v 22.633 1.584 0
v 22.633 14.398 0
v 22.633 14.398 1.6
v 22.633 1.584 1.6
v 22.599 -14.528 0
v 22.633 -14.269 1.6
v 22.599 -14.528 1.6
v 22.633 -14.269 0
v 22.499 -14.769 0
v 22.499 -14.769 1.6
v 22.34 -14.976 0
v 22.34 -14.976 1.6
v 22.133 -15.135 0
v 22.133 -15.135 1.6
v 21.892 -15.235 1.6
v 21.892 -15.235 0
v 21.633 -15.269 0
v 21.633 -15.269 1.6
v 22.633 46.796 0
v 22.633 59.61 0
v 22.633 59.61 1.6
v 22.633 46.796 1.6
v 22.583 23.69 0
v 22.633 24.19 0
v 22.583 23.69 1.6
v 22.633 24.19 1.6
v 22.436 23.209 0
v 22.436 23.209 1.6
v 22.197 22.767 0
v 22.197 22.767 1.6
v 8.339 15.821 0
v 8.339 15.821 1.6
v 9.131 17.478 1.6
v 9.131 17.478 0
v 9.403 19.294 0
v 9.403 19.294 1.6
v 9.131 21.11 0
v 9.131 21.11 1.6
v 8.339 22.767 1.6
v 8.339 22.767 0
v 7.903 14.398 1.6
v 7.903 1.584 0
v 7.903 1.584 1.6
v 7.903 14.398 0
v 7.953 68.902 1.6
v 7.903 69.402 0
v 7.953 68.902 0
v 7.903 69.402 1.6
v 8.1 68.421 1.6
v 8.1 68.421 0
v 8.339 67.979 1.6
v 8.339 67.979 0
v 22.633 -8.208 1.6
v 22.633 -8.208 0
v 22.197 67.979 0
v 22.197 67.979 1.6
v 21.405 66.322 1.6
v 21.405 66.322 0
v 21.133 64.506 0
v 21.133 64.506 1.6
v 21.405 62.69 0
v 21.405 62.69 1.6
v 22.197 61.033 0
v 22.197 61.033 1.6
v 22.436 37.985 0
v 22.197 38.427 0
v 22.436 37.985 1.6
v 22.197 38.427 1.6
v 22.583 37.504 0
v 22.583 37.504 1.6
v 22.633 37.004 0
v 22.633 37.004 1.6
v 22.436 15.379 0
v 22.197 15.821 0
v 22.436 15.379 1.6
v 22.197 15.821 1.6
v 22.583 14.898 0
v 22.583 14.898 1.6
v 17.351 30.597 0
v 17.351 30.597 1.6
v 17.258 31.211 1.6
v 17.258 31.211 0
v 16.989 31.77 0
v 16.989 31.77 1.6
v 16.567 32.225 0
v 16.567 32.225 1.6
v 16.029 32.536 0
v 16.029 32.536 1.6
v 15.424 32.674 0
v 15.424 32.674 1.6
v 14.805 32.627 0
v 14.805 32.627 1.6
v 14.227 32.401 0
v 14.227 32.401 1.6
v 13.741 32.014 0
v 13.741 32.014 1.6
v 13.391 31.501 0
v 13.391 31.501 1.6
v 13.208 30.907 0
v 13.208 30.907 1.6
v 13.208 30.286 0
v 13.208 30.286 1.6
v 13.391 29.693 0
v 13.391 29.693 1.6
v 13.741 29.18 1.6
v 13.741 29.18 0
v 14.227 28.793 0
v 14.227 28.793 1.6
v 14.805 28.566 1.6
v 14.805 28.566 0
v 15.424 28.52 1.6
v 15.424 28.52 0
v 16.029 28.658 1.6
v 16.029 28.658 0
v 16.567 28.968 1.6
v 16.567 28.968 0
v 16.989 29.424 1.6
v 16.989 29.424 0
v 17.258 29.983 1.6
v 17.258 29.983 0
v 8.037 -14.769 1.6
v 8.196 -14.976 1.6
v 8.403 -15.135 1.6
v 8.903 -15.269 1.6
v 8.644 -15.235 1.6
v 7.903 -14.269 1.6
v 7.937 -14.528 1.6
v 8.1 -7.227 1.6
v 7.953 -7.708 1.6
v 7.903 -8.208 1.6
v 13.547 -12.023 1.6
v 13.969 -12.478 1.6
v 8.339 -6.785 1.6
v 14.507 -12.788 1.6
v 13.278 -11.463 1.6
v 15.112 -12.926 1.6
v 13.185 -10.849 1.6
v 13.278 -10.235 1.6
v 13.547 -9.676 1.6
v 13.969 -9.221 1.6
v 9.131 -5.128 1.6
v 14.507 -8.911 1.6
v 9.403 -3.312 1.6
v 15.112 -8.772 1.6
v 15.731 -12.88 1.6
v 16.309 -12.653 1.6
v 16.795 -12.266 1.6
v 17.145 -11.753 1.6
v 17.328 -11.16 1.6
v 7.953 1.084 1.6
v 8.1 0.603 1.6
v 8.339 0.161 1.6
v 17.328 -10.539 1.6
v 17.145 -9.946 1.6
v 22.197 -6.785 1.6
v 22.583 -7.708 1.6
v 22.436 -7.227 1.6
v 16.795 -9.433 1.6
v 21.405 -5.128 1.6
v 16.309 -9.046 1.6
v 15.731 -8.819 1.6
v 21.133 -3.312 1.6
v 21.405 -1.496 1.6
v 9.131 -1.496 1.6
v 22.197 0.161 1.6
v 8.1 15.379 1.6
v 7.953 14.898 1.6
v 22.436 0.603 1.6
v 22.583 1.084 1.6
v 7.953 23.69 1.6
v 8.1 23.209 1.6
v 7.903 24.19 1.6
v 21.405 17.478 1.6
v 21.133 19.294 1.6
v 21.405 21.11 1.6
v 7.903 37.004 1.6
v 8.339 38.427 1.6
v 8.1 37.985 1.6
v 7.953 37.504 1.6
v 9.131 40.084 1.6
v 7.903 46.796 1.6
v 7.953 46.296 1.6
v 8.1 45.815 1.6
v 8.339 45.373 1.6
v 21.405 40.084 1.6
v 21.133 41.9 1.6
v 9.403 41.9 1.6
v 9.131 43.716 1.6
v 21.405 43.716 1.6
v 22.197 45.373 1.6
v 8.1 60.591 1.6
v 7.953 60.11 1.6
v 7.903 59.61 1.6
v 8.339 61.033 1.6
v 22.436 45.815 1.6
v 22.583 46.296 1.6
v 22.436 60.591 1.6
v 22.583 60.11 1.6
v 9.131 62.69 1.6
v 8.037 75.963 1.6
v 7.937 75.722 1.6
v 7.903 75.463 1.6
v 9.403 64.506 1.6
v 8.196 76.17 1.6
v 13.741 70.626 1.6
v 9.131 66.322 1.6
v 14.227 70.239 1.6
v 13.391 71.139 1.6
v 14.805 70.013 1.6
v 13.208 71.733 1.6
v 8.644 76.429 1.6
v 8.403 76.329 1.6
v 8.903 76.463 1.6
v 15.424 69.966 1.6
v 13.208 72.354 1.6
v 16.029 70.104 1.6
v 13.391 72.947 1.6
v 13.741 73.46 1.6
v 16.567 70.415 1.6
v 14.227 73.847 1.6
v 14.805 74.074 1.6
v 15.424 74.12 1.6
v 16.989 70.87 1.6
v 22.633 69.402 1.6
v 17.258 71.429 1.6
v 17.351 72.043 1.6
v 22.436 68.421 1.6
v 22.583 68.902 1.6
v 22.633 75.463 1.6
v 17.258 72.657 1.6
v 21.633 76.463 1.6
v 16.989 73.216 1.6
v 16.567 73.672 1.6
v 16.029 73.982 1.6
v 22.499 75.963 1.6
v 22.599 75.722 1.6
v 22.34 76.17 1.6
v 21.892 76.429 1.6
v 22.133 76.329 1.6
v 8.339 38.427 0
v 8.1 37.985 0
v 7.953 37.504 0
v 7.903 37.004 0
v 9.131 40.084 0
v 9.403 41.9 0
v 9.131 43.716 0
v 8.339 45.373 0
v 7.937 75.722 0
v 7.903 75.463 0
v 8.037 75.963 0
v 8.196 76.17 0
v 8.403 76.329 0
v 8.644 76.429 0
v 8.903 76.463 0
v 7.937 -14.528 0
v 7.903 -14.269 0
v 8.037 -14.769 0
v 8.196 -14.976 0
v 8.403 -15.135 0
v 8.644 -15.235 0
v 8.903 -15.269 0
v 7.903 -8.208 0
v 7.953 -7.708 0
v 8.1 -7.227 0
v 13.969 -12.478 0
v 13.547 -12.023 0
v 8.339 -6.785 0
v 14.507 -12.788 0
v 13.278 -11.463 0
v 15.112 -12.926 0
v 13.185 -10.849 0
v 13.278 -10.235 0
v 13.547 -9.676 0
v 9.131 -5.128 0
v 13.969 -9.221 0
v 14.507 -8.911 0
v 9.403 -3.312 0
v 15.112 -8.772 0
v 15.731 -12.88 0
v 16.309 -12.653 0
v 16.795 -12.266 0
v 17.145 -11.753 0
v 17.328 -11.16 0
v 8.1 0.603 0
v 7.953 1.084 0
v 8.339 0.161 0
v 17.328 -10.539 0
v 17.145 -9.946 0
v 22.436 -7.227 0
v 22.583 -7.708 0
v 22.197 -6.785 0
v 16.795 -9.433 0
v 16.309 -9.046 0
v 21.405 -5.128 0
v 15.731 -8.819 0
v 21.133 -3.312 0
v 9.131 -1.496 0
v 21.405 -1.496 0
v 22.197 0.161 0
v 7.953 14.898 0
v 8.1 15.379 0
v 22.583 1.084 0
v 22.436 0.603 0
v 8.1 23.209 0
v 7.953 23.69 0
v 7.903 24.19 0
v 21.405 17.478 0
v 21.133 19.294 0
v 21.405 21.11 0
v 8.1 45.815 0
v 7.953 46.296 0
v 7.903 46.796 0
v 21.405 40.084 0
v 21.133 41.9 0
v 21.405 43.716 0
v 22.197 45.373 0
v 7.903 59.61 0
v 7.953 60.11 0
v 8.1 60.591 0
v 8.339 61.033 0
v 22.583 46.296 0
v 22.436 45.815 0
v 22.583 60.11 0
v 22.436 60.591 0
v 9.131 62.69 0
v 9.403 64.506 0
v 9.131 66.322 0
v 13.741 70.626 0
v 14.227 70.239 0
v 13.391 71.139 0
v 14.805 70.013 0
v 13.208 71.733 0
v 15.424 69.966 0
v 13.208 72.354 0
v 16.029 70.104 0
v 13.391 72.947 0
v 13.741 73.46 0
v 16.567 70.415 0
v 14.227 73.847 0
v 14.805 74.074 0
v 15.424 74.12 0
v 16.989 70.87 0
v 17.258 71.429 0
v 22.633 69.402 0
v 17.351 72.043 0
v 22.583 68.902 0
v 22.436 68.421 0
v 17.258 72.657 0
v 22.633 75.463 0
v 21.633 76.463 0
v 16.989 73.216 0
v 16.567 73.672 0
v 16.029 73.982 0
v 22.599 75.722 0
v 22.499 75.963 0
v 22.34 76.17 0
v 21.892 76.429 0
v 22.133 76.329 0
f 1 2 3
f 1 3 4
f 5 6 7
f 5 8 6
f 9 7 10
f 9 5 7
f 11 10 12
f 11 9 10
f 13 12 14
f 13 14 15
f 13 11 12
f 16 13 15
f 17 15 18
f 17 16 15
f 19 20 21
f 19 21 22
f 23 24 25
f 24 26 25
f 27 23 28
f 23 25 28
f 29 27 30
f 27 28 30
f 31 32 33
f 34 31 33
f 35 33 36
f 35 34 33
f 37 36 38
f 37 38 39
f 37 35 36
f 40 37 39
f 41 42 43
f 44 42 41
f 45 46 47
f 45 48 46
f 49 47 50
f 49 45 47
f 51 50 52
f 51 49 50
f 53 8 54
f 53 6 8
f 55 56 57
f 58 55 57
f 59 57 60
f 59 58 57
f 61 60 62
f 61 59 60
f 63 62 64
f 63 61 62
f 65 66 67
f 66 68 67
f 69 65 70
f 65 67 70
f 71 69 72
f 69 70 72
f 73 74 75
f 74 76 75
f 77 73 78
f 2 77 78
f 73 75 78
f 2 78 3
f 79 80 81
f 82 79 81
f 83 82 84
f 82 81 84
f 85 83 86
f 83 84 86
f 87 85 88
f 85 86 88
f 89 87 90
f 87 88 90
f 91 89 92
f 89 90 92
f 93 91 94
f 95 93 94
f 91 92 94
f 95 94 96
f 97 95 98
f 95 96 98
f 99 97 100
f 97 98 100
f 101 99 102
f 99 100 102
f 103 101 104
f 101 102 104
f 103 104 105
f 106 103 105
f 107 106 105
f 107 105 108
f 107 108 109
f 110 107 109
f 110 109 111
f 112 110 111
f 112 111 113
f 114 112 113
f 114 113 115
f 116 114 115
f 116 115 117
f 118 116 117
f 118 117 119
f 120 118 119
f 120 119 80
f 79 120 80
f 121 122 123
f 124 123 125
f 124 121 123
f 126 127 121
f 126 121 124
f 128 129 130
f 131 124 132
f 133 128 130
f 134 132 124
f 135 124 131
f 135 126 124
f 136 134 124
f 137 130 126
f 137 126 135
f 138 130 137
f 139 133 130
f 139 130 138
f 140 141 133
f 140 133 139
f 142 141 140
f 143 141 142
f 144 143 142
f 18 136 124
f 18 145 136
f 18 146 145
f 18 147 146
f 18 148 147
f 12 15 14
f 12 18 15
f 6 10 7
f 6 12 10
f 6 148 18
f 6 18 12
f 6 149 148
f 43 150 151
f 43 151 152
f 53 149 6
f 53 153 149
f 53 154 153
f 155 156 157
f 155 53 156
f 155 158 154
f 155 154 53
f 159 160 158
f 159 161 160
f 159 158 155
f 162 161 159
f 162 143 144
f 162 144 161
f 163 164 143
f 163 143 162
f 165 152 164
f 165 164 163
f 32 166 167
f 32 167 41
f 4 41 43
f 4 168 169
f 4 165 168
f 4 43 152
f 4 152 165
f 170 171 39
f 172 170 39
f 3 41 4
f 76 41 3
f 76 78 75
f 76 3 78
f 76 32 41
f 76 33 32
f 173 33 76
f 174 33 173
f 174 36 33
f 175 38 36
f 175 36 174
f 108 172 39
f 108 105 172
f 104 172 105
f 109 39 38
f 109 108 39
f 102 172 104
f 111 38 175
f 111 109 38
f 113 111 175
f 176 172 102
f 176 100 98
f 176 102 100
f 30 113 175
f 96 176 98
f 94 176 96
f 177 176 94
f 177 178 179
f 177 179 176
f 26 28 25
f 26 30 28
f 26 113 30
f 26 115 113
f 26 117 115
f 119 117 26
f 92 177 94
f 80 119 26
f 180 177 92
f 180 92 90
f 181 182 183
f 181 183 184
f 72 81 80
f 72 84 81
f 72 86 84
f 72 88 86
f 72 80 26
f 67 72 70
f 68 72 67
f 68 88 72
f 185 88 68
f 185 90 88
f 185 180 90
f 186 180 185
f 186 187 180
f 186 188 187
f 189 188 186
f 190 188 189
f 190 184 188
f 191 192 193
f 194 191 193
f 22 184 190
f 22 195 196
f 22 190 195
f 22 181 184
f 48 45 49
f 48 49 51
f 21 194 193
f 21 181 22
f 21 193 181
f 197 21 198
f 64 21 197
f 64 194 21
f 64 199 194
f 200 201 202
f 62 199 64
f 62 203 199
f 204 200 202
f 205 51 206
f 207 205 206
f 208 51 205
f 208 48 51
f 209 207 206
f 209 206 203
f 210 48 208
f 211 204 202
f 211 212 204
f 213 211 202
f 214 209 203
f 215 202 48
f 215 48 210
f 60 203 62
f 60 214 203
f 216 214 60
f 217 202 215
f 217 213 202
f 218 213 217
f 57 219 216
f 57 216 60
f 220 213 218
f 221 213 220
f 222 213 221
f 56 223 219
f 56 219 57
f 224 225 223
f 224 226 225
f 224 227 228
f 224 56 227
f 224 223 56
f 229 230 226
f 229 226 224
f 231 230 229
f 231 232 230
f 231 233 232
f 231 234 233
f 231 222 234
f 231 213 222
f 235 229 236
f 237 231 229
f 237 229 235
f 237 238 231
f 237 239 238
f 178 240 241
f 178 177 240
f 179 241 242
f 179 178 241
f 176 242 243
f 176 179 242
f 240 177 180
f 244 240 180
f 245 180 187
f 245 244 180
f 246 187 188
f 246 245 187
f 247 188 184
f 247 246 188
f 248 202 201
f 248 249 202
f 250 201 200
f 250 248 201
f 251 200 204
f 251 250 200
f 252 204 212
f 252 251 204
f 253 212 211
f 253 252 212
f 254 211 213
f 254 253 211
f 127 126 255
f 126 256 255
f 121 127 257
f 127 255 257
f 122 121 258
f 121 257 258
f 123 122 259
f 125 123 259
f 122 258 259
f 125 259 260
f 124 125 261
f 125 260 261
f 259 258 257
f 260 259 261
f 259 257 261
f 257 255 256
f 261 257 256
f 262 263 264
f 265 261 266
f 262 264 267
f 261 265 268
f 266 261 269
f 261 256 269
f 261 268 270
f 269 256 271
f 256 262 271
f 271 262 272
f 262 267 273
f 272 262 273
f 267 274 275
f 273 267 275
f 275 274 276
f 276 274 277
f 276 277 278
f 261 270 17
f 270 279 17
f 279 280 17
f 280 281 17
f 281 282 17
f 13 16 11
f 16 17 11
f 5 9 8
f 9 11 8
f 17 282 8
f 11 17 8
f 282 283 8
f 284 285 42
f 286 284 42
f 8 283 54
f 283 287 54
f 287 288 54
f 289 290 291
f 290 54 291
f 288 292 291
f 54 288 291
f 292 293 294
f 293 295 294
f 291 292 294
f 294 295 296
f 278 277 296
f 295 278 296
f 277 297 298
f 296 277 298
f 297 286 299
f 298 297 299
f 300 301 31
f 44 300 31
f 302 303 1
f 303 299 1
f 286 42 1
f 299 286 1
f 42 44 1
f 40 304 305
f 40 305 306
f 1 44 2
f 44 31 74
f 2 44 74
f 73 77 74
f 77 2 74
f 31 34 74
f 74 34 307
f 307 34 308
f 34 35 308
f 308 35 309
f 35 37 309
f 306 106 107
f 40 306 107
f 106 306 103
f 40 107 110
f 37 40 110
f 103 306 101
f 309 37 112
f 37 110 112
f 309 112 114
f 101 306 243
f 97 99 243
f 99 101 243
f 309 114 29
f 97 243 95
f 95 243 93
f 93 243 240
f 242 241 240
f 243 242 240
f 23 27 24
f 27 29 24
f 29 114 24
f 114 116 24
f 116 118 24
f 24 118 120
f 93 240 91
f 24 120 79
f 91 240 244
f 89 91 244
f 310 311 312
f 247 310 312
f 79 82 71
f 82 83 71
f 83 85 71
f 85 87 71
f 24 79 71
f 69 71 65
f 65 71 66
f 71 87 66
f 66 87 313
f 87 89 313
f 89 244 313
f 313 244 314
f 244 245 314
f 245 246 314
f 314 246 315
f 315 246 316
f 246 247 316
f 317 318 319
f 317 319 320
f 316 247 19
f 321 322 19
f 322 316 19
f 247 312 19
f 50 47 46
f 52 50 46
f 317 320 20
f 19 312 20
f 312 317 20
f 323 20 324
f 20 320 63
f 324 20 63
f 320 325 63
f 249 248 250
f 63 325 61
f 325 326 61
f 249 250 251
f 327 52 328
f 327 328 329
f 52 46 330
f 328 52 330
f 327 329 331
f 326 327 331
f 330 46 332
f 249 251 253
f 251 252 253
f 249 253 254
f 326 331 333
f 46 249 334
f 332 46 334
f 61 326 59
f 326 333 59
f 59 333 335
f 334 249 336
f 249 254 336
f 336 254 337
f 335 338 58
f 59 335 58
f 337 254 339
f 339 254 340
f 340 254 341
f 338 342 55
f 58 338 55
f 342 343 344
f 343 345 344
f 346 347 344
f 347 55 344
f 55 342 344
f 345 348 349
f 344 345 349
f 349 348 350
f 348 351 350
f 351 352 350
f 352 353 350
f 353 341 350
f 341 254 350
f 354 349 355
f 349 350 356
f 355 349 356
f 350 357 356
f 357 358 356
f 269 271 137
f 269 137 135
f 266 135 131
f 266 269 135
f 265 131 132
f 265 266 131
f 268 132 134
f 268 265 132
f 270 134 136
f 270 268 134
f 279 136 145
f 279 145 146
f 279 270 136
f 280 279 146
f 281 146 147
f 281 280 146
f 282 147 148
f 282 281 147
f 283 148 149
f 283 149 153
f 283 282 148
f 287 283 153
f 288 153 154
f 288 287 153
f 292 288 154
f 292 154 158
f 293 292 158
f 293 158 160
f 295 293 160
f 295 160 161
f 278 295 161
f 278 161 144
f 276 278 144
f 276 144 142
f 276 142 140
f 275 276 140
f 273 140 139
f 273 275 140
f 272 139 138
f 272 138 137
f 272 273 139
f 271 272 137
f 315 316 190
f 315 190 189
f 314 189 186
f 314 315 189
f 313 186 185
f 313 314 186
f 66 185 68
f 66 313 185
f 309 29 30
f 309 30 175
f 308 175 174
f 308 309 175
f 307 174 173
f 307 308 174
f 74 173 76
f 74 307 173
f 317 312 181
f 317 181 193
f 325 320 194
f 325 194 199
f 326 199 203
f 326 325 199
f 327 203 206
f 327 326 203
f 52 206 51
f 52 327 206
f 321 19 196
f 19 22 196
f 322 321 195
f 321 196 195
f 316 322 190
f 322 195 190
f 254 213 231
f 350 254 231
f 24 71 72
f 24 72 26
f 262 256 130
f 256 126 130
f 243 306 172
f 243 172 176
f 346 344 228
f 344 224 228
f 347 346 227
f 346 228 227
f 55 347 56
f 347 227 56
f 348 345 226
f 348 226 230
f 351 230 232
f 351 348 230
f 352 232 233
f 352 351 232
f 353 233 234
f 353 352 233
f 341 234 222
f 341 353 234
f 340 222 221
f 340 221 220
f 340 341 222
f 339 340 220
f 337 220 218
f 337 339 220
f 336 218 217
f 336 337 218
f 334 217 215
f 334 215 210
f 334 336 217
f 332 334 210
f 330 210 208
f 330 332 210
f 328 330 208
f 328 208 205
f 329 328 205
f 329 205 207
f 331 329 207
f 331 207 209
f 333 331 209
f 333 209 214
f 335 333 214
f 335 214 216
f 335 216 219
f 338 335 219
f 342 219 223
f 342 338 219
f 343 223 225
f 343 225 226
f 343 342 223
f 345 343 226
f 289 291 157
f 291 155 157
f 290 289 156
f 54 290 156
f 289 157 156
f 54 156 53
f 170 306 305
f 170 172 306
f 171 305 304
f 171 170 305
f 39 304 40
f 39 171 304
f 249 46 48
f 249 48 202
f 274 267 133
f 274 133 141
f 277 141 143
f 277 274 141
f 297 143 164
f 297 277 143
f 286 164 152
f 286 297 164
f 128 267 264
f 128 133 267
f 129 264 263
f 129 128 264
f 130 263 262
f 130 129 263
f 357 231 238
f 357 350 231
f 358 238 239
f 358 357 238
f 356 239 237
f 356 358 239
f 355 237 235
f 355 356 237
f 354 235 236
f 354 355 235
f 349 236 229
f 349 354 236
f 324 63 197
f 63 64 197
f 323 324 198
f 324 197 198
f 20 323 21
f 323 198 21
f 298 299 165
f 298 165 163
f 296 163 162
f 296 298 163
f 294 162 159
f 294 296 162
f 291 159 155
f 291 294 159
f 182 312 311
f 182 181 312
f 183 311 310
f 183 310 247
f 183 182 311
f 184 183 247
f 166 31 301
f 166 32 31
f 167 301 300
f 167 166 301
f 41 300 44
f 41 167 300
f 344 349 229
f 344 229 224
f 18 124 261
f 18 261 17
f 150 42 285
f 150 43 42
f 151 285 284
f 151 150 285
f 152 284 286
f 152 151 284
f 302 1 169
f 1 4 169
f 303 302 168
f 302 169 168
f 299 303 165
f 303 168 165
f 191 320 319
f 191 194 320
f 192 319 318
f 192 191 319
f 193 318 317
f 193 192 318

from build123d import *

# Parameters (mm, degrees)
SKETCH1_R           = 2.0828
BOSS_EXTRUDE1_DEPTH = 1.6
FILLET1_R           = 2.54
SKETCH3_R           = 2.0828
CUT_EXTRUDE1_DEPTH  = 79.362595117
SKETCH4_W           = 14.730000004
SKETCH4_H           = 1.456840112
BOSS_EXTRUDE2_DEPTH = 1.6
FILLET2_R           = 1


with BuildPart() as part:
    # Sketch1 → Boss-Extrude1 (new body)
    with BuildSketch(Plane.XY):
        with BuildLine():
            Line((7.903015948, 75.005885785), (22.633015952, 75.005885785))
            Line((22.633015952, 75.005885785), (22.633015952, 68.549399108))
            ThreePointArc((22.633015952, 68.549399108), (21.133015952, 64.505885785), (22.633015952, 60.462372462))
            Line((22.633015952, 60.462372462), (22.633015952, 45.943399108))
            ThreePointArc((22.633015952, 45.943399108), (21.133015952, 41.899885785), (22.633015952, 37.856372462))
            Line((22.633015952, 37.856372462), (22.633015952, 23.337399108))
            ThreePointArc((22.633015952, 23.337399108), (21.133015952, 19.293885785), (22.633015952, 15.250372462))
            Line((22.633015952, 15.250372462), (22.633015952, 0.731399108))
            ThreePointArc((22.633015952, 0.731399108), (21.133015952, -3.312114215), (22.633015952, -7.355627538))
            Line((22.633015952, -7.355627538), (22.633015952, -13.812114215))
            Line((22.633015952, -13.812114215), (7.903015948, -13.812114215))
            Line((7.903015948, -13.812114215), (7.903015948, -7.355627538))
            ThreePointArc((7.903015948, -7.355627538), (9.403015948, -3.312114215), (7.903015948, 0.731399108))
            Line((7.903015948, 0.731399108), (7.903015948, 15.250372462))
            ThreePointArc((7.903015948, 15.250372462), (9.403015948, 19.293885785), (7.903015948, 23.337399108))
            Line((7.903015948, 23.337399108), (7.903015948, 37.856372462))
            ThreePointArc((7.903015948, 37.856372462), (9.403015948, 41.899885785), (7.903015948, 45.943399108))
            Line((7.903015948, 45.943399108), (7.903015948, 60.462372462))
            ThreePointArc((7.903015948, 60.462372462), (9.403015948, 64.505885785), (7.903015948, 68.549399108))
            Line((7.903015948, 68.549399108), (7.903015948, 75.005885785))
        make_face()
        with Locations((15.26801595, 72.043125897)):
            Circle(SKETCH1_R, mode=Mode.SUBTRACT)
        with Locations(Location((15.26801595, -10.849354327, 0), (0, 0, 180))):
            Circle(SKETCH1_R, mode=Mode.SUBTRACT)
    extrude(amount=BOSS_EXTRUDE1_DEPTH)

    # Fillet1
    fillet1_edges = [part.edges().sort_by_distance(p)[0] for p in [
        (22.633015952, 68.549399108, 0.8),
        (22.633015952, 60.462372462, 0.8),
        (22.633015952, 45.943399108, 0.8),
        (22.633015952, 37.856372462, 0.8),
        (22.633015952, 23.337399108, 0.8),
        (22.633015952, 15.250372462, 0.8),
        (22.633015952, 0.731399108, 0.8),
        (22.633015952, -7.355627538, 0.8),
        (7.903015948, -7.355627538, 0.8),
        (7.903015948, 0.731399108, 0.8),
        (7.903015948, 15.250372462, 0.8),
        (7.903015948, 23.337399108, 0.8),
        (7.903015948, 37.856372462, 0.8),
        (7.903015948, 45.943399108, 0.8),
        (7.903015948, 60.462372462, 0.8),
        (7.903015948, 68.549399108, 0.8),
    ]]
    fillet(fillet1_edges, radius=FILLET1_R)

    # Sketch3 → Cut-Extrude1 (cut, through all)
    with BuildSketch(Plane.XY.offset(1.6)):
        with Locations((15.26801595, 30.596885785)):
            Circle(SKETCH3_R)
    extrude(amount=-CUT_EXTRUDE1_DEPTH, mode=Mode.SUBTRACT)

    # Sketch4 → Boss-Extrude2 (add, through all)
    with BuildSketch(Plane.XY.offset(1.6)):
        with Locations((15.26801595, -14.540534271)):
            Rectangle(SKETCH4_W, SKETCH4_H)
        with Locations((15.26801595, 75.734305841)):
            Rectangle(SKETCH4_W, SKETCH4_H)
    extrude(amount=-BOSS_EXTRUDE2_DEPTH)

    # Fillet2
    fillet2_edges = [part.edges().sort_by_distance(p)[0] for p in [
        (7.903015948, 76.462725897, 0.8),
        (22.633015952, 76.462725897, 0.8),
        (7.903015948, -15.268954327, 0.8),
        (22.633015952, -15.268954327, 0.8),
    ]]
    fillet(fillet2_edges, radius=FILLET2_R)


solid = part.part
